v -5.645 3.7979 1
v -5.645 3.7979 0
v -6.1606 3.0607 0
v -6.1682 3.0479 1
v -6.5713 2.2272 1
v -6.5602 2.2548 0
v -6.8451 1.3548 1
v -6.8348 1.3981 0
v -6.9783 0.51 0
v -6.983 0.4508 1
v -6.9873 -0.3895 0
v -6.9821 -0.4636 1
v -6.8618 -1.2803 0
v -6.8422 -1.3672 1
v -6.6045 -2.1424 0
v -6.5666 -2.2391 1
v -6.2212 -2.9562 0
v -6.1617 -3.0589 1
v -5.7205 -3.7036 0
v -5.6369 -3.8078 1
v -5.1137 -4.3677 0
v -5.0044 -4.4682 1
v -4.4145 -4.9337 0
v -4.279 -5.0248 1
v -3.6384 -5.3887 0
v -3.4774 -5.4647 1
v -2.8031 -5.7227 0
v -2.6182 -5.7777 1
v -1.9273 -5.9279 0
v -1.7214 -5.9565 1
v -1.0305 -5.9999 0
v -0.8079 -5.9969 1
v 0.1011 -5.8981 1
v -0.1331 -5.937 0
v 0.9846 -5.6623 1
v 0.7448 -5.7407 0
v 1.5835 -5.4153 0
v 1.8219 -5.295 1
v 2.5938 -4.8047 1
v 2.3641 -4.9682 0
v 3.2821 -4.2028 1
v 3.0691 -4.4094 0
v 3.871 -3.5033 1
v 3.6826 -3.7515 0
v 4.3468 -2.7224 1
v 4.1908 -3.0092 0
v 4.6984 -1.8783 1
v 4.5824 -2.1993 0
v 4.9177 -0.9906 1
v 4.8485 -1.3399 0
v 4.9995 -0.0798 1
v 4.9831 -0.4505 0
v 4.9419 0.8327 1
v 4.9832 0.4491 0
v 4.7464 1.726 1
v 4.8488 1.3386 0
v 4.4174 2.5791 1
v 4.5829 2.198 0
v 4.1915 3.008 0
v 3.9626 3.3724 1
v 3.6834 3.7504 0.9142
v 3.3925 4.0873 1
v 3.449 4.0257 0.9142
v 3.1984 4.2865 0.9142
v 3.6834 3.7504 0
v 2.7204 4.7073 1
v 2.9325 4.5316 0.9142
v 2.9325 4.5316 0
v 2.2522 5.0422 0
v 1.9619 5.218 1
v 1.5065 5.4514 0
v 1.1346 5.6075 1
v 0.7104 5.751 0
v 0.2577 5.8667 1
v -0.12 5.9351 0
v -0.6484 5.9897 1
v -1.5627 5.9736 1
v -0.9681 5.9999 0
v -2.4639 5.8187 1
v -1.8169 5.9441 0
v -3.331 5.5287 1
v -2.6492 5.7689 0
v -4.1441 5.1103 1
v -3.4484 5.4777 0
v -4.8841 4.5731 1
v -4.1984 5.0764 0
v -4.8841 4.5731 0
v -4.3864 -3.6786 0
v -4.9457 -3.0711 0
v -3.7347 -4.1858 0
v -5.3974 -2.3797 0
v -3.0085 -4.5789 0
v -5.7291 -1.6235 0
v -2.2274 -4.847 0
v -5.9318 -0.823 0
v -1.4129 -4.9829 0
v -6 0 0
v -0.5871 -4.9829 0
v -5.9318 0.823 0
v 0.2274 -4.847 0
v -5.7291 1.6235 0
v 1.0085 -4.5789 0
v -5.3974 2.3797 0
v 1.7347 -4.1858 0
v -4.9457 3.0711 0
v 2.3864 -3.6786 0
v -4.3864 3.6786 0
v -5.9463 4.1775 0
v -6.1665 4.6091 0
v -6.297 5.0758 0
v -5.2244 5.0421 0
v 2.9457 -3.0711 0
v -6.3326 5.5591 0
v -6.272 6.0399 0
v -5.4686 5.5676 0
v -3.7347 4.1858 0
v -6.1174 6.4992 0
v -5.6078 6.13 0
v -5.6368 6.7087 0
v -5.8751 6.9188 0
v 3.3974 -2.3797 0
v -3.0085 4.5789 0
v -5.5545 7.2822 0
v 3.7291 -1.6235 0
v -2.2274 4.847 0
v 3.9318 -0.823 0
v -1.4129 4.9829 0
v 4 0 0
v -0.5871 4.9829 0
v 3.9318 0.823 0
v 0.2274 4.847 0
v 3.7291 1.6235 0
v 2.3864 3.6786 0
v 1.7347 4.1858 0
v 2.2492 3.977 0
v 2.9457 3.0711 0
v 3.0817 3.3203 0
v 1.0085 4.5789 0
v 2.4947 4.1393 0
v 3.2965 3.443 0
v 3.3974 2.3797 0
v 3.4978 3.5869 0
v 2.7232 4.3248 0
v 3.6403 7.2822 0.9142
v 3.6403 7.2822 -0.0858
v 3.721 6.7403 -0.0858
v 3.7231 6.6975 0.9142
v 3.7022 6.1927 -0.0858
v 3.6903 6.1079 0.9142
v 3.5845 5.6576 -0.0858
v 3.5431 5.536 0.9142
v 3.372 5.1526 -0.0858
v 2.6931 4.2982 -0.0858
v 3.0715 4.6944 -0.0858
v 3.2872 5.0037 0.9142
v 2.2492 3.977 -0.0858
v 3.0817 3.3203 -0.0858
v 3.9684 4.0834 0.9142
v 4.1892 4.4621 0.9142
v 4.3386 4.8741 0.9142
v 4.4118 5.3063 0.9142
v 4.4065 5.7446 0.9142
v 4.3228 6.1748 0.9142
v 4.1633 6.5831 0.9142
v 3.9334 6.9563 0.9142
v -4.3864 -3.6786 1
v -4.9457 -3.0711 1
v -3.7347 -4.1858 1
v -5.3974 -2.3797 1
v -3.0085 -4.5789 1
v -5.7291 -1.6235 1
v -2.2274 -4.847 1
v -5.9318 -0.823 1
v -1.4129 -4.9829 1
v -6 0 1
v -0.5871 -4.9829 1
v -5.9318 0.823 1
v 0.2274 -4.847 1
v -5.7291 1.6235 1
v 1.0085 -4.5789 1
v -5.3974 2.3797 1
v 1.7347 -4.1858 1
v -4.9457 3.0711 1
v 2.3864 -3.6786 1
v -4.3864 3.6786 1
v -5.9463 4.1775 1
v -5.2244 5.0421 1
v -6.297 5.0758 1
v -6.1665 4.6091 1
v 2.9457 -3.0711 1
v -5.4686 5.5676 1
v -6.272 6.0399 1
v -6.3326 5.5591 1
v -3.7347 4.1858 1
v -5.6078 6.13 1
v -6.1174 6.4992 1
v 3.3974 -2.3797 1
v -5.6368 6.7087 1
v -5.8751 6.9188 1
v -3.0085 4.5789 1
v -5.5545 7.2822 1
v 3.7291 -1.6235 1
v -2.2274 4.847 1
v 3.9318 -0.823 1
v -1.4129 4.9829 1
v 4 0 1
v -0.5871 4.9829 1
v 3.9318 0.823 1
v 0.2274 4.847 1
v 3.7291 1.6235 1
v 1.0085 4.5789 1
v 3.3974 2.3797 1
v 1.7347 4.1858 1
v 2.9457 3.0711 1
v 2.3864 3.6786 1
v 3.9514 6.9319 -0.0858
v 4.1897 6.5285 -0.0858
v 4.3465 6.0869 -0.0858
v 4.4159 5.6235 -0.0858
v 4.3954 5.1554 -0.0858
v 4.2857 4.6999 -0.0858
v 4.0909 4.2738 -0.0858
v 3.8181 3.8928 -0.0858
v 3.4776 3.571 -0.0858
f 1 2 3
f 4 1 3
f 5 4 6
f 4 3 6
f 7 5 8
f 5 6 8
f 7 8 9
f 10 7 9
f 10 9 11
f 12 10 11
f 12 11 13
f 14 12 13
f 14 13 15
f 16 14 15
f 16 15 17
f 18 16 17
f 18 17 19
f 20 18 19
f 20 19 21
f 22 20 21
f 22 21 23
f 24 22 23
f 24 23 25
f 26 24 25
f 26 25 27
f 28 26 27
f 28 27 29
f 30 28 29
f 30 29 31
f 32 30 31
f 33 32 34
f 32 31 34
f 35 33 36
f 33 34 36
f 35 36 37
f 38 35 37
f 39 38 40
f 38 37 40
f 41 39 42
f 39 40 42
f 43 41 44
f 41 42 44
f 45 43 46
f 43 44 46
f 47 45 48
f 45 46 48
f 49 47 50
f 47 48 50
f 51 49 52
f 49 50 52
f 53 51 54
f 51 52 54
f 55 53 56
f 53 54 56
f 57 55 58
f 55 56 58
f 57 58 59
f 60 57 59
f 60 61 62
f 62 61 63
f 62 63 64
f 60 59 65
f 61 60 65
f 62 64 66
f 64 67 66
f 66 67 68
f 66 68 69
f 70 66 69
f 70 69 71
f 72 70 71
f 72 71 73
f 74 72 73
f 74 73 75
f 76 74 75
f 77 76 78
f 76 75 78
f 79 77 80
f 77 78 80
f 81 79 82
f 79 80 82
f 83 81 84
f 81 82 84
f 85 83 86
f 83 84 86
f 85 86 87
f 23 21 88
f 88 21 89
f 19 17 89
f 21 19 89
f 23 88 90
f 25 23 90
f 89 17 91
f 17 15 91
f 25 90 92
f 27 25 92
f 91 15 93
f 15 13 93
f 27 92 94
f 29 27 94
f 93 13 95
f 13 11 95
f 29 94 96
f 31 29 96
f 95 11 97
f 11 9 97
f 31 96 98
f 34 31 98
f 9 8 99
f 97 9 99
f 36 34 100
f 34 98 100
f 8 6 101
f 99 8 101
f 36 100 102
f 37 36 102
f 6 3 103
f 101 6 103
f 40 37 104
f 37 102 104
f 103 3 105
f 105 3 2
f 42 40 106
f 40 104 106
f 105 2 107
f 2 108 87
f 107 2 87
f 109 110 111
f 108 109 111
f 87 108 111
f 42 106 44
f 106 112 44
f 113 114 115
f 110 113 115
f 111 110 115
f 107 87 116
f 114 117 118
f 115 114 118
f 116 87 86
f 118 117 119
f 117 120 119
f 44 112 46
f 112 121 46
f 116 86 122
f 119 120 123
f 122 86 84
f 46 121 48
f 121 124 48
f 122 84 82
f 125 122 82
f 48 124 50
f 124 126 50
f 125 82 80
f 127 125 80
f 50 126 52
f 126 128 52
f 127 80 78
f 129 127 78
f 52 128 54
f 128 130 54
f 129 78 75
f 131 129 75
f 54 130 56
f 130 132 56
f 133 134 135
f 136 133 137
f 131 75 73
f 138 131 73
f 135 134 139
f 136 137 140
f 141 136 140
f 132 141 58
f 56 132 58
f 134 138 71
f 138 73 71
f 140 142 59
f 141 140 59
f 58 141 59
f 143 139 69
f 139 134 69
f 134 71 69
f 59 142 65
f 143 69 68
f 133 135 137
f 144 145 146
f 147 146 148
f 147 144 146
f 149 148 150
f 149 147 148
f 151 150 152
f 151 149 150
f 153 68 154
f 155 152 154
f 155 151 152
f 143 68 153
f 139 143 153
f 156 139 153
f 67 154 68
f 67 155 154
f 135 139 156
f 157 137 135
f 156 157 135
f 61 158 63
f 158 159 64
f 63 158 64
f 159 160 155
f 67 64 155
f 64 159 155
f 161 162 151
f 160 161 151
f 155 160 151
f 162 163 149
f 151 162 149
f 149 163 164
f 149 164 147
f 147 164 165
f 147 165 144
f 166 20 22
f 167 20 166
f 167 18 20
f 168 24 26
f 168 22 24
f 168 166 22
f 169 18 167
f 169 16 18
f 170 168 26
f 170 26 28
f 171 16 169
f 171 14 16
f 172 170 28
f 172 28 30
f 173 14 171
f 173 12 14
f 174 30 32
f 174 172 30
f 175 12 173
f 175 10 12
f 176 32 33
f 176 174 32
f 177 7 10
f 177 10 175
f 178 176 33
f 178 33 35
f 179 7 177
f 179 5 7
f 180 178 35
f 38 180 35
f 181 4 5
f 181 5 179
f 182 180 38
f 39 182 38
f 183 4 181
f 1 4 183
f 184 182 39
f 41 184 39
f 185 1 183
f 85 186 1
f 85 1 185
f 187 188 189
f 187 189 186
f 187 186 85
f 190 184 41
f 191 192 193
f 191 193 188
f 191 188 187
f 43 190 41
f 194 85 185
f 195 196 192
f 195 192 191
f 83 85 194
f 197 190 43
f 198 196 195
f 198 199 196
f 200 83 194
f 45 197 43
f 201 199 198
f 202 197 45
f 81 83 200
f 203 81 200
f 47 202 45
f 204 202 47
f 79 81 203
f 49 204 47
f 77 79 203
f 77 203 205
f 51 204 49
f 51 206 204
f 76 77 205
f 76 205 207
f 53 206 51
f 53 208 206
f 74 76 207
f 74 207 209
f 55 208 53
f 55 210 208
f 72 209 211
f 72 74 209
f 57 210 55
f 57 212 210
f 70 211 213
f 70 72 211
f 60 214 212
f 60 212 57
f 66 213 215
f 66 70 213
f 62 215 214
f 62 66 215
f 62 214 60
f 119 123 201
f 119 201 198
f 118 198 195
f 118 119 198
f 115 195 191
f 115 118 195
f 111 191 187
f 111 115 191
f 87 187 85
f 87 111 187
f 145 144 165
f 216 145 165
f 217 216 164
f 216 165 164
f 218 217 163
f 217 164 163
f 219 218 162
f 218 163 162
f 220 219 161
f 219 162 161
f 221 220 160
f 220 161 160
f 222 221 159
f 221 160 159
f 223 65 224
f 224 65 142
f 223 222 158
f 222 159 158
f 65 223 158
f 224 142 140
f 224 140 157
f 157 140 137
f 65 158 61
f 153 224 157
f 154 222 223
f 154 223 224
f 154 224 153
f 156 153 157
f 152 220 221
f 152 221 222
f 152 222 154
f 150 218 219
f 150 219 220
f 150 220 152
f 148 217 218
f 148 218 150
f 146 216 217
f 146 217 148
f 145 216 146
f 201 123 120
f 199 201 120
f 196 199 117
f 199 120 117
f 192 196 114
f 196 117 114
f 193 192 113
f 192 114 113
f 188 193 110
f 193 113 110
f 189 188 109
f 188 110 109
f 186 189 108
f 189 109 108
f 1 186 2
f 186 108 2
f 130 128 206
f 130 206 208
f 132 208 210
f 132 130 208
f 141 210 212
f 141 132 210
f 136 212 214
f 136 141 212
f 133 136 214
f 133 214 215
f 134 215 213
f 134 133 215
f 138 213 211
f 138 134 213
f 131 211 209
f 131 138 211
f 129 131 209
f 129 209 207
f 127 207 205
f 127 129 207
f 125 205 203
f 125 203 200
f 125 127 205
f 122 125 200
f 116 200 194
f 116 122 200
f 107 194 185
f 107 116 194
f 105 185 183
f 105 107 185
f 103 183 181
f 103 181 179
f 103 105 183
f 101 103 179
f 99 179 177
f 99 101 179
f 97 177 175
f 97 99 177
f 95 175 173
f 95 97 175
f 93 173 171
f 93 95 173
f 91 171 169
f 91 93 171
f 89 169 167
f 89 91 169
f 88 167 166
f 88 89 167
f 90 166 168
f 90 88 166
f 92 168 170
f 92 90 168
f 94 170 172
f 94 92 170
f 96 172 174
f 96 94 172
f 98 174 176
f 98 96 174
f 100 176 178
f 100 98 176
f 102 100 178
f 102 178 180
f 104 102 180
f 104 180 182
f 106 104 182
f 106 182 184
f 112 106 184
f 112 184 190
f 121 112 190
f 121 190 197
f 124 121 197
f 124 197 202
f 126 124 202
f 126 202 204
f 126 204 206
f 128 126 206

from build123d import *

# Parameters (mm, degrees)
EXTRUDE001_DEPTH           = 1
EXTRUDE_DEPTH              = 1
TUBE_R                     = 6
TUBE_R_2                   = 5
TUBE_DEPTH                 = 1
EXTRUDE002_DEPTH           = 1
EXTRUDE002_PLACEMENT_ANGLE = 180


with BuildPart() as extrude001:
    # Sketch → Extrude001 (new body)
    with BuildSketch(Plane.XY):
        with BuildLine():
            ThreePointArc((-5.554538, 7.282242), (-6.309564, 5.15544), (-4.995944, 3.320296))
            Line((-4.995944, 3.320296), (-4.163386, 3.976998))
            ThreePointArc((-5.554538, 7.282242), (-5.403982, 5.400225), (-4.163386, 3.976998))
        make_face()
    extrude(amount=EXTRUDE001_DEPTH)


with BuildPart() as extrude_body:
    # Sketch → Extrude (new body)
    with BuildSketch(Plane.XY):
        with BuildLine():
            ThreePointArc((-5.554538, 7.282242), (-6.309564, 5.15544), (-4.995944, 3.320296))
            Line((-4.995944, 3.320296), (-4.163386, 3.976998))
            ThreePointArc((-5.554538, 7.282242), (-5.403982, 5.400225), (-4.163386, 3.976998))
        make_face()
    extrude(amount=EXTRUDE_DEPTH)


with BuildPart() as tube:
    # Tube → Tube (new body)
    with BuildSketch(Plane(origin=(-1, 0, 0), x_dir=(1, 0, 0), z_dir=(0, 0, 1))):
        Circle(TUBE_R)
        Circle(TUBE_R_2, mode=Mode.SUBTRACT)
    extrude(amount=TUBE_DEPTH)


with BuildPart() as fusion:
    # Sketch001 → Extrude002 (new body)
    with BuildSketch(Plane.XY):
        with BuildLine():
            ThreePointArc((-5.554538, 7.282242), (-6.309564, 5.15544), (-4.995944, 3.320296))
            Line((-4.995944, 3.320296), (-4.163386, 3.976998))
            ThreePointArc((-5.554538, 7.282242), (-5.403982, 5.400225), (-4.163386, 3.976998))
        make_face()
    extrude(amount=EXTRUDE002_DEPTH)


with BuildPart() as fusion_1:
    # Extrude002 placement: moved
    add(fusion.part.moved(Location((-1.914214, 0, 0.914214))).rotate(Axis((-1.914214, 0, 0.914214), (0, 1, 0)), EXTRUDE002_PLACEMENT_ANGLE))

    # Fusion: union Extrude001, Extrude body, Tube
    add(extrude001.part)
    add(extrude_body.part)
    add(tube.part)


solid = fusion_1.part
